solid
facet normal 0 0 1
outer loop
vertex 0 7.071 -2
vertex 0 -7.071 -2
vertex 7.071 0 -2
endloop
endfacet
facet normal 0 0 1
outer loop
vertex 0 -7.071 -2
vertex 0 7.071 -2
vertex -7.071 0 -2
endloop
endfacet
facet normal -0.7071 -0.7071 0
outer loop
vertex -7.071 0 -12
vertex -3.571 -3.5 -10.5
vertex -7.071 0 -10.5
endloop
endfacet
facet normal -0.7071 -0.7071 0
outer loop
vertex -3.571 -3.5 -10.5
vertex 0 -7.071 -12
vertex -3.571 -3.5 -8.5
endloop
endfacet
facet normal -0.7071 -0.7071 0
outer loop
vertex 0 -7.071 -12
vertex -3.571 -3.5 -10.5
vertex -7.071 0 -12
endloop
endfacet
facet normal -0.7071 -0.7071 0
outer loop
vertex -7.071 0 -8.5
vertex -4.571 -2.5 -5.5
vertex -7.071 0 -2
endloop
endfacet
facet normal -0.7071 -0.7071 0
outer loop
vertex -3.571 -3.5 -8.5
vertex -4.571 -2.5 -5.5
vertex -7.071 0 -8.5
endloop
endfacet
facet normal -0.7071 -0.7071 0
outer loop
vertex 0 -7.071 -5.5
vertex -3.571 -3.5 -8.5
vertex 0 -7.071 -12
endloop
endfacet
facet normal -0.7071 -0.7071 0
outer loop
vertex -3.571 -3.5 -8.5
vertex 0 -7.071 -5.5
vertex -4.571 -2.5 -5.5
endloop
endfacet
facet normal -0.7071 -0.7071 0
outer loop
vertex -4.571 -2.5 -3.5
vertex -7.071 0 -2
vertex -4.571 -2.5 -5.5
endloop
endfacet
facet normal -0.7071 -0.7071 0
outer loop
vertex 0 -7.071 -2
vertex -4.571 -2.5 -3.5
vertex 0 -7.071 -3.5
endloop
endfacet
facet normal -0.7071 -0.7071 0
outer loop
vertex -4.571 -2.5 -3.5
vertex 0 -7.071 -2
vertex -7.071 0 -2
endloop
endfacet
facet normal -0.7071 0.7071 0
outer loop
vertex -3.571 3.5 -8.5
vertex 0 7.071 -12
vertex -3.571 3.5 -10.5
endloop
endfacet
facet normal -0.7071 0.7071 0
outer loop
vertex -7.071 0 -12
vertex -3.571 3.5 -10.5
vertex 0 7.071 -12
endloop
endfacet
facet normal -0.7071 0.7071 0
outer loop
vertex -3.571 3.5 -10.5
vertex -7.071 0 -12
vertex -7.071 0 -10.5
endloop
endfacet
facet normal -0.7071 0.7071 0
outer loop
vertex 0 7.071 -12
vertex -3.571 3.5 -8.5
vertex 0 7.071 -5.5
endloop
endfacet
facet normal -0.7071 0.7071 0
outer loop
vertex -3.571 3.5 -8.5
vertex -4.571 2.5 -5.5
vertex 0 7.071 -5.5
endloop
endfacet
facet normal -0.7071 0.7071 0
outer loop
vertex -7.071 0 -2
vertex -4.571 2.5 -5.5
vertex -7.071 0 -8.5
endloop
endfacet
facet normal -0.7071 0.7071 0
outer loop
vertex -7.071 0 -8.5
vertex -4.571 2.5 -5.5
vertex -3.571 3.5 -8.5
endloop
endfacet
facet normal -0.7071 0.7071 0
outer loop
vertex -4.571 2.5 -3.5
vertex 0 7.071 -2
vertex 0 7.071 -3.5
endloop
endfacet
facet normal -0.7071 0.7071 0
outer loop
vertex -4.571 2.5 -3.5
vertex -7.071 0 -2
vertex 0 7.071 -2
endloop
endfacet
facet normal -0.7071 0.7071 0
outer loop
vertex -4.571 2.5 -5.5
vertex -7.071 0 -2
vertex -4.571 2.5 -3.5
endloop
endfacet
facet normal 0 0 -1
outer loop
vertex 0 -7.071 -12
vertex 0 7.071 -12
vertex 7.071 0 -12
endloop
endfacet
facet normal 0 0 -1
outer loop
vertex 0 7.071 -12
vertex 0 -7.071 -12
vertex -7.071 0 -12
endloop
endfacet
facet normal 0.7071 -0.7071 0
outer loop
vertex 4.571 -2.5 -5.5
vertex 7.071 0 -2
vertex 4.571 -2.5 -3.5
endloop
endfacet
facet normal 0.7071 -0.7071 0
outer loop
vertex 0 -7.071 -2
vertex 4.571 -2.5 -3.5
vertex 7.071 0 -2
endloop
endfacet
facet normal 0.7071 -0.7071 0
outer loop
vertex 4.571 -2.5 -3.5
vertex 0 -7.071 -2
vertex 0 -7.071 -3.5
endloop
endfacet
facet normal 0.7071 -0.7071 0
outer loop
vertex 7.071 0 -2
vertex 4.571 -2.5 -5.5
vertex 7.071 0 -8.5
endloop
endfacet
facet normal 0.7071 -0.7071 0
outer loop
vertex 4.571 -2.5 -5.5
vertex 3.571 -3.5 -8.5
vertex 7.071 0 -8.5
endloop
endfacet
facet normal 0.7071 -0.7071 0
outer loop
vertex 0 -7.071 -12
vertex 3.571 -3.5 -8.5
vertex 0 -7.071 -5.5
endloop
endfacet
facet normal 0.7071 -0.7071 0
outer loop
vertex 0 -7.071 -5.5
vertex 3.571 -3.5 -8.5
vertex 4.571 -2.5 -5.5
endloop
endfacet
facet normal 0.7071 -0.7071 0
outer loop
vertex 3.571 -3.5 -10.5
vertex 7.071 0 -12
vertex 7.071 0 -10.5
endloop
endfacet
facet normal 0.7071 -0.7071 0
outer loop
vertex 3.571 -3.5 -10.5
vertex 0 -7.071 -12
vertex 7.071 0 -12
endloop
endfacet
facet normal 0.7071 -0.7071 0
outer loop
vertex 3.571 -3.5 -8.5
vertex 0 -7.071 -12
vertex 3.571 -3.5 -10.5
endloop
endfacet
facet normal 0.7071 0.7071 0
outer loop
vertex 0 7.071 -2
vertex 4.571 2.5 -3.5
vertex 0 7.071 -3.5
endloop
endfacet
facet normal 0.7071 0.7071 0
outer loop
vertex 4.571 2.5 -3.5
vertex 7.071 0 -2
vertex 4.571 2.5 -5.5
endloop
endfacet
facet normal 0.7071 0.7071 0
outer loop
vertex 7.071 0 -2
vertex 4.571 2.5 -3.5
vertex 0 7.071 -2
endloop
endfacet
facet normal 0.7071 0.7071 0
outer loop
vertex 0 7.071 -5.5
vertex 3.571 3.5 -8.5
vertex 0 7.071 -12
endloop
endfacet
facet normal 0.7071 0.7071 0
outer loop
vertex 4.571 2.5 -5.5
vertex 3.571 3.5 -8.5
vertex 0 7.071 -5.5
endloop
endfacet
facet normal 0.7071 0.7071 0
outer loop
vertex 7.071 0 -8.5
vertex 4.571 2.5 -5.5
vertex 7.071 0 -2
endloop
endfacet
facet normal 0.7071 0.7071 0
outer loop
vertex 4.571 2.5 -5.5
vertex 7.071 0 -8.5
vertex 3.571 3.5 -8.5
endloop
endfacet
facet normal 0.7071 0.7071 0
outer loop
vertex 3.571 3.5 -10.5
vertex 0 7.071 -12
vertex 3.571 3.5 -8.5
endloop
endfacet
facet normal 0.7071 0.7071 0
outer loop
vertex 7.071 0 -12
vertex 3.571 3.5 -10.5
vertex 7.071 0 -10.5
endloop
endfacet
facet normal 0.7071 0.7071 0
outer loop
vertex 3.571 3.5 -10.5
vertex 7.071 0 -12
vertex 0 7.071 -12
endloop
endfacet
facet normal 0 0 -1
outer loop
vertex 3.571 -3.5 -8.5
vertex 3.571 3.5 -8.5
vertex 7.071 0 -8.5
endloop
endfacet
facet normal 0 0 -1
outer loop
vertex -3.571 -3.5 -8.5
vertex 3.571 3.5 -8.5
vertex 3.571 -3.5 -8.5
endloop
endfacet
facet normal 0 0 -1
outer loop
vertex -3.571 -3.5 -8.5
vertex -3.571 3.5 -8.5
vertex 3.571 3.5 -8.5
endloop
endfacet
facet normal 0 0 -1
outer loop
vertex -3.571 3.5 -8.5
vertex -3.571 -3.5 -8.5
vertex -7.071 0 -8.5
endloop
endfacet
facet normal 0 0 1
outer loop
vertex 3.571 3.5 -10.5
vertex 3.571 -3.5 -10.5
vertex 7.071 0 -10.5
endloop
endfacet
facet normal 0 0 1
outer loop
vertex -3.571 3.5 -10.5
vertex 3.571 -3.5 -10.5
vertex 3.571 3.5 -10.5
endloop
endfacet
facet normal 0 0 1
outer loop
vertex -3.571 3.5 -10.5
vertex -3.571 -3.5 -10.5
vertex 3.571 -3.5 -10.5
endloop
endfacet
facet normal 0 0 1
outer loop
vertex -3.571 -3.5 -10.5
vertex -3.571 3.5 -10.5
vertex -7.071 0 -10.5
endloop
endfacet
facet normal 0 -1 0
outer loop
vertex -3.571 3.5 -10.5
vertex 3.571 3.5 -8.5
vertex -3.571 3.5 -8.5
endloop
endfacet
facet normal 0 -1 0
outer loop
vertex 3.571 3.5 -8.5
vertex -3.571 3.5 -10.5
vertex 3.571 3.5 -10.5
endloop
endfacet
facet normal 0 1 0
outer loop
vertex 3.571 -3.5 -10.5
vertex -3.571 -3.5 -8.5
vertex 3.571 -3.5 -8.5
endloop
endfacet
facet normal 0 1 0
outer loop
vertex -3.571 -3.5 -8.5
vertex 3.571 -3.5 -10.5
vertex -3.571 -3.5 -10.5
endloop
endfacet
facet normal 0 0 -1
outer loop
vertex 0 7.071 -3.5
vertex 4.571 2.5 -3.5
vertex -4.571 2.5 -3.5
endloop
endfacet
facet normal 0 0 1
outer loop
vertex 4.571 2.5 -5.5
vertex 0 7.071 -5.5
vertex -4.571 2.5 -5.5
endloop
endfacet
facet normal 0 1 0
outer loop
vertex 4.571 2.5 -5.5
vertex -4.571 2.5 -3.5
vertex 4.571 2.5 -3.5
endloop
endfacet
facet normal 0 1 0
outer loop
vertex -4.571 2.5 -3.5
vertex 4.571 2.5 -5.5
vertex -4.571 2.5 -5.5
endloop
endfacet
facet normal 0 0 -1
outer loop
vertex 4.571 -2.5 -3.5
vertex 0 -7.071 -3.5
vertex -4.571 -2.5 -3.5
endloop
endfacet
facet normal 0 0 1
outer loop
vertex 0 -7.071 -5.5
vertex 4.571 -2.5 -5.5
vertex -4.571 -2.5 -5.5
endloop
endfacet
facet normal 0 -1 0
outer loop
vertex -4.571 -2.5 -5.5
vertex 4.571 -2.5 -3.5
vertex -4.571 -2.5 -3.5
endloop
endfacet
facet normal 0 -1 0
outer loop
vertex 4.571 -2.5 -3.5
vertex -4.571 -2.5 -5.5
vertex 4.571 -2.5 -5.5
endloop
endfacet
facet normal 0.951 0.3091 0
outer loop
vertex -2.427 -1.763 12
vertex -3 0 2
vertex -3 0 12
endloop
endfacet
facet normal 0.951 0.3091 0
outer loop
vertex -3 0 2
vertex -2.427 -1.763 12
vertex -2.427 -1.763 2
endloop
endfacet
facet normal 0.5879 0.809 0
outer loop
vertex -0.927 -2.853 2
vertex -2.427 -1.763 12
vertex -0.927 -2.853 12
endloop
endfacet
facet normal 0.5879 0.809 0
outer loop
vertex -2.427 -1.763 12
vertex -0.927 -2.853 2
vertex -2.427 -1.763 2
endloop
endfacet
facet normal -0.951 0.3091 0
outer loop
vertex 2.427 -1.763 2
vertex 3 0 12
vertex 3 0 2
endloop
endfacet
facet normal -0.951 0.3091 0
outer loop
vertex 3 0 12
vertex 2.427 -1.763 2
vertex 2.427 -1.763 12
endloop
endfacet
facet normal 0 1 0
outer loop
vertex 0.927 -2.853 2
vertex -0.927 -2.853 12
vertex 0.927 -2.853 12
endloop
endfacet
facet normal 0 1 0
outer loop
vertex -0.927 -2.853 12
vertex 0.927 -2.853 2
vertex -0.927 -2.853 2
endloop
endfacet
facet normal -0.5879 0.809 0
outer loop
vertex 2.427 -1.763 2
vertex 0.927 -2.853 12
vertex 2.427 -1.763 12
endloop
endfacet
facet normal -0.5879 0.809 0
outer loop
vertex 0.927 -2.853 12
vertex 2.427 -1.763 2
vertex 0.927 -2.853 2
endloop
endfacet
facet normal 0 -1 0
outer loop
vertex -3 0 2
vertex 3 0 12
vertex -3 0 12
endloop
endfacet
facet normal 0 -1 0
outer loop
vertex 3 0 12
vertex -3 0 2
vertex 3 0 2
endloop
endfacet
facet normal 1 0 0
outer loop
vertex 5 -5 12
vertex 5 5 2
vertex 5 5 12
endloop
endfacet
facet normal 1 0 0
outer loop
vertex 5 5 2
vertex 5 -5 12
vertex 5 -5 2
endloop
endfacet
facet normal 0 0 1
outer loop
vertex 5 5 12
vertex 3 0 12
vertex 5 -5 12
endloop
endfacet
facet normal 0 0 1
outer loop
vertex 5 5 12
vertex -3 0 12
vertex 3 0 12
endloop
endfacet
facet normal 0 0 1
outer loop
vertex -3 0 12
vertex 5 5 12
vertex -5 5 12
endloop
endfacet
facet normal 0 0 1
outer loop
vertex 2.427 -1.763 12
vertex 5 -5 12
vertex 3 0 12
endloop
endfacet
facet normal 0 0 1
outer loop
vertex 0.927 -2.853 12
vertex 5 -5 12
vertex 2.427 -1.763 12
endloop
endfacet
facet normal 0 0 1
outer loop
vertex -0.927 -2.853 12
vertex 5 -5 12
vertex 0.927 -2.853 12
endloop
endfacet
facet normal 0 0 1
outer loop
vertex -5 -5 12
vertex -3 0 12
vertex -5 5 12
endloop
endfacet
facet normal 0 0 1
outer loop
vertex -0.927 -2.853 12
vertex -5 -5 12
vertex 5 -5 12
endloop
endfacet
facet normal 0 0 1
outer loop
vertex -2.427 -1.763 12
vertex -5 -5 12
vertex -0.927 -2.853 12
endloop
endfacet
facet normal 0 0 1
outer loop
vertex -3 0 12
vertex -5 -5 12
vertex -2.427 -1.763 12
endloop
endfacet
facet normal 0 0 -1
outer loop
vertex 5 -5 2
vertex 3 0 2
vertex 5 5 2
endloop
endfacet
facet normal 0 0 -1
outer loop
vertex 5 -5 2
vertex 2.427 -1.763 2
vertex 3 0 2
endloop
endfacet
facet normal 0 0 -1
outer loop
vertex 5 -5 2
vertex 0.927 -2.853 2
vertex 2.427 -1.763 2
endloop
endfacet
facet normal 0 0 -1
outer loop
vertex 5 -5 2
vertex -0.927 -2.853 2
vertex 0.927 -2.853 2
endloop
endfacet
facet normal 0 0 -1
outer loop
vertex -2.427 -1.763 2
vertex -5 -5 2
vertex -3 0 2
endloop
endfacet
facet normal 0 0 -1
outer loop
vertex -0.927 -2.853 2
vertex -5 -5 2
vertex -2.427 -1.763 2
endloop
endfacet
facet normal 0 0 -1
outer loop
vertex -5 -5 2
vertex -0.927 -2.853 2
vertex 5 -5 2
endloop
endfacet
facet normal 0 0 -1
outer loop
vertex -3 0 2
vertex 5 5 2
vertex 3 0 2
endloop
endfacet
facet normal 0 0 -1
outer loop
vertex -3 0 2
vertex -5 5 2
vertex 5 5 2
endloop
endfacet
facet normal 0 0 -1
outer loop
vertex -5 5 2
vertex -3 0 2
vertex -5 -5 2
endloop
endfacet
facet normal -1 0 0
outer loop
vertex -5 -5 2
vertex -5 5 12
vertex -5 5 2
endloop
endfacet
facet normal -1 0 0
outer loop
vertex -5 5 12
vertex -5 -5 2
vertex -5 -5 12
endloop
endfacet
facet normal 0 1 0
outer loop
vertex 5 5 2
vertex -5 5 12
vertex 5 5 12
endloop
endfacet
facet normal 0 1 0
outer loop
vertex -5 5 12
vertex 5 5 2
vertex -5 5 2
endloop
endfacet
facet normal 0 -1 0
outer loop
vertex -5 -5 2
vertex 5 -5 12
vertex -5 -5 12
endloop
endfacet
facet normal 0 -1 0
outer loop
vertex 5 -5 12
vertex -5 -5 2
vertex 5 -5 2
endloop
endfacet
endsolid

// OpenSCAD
translate([0, 0, -7]) 
difference(){
rotate([0, 0, 45]) {
    cube([10,10,10],center=true);
}
translate([0, 0, -2.5]) {
    cube([25,7,2],center=true);
}
translate([0, 6, 2.5]) {
    cube([25,7,2],center=true);
}
translate([0, -6, 2.5]) {
    cube([25,7,2],center=true);
}

}
translate([0, 0, 7]) TheCDBox();

module TheCDBox(){
    //rotate([0, 0, 45])
    difference(){
    cube([10,10,10],center=true);
    TheD();

    }
}

module TheDBox(){ 

intersection(){
    difference(){
        rotate([0, 0, 45]) {
            cube([10,10,10],center=true);
        }
        rotate([180, 90, 180]) 
        translate([0, 5, 0]) {
        TheD();
        }
        rotate([0, 90, 180]) 
        translate([0, 5, 0]) {
       TheD();
        }
       // cube 
    }
///out side of the d 
union(){
 rotate([0, 90, 0]) {
       translate([0, -6, 0])   cylinder(r=6.5, h=25, center=true);
 }
rotate([0, 90, 0]) {
       translate([0, 6, 0])   cylinder(r=6.5, h=25, center=true);
 }
}

}
}
module TheD(){ 
    
    difference(){
    cylinder(r=3, h=25, center=true);
     translate([0, 1.5, 0]) cube([6,3,25.1],center=true);
    }
}
